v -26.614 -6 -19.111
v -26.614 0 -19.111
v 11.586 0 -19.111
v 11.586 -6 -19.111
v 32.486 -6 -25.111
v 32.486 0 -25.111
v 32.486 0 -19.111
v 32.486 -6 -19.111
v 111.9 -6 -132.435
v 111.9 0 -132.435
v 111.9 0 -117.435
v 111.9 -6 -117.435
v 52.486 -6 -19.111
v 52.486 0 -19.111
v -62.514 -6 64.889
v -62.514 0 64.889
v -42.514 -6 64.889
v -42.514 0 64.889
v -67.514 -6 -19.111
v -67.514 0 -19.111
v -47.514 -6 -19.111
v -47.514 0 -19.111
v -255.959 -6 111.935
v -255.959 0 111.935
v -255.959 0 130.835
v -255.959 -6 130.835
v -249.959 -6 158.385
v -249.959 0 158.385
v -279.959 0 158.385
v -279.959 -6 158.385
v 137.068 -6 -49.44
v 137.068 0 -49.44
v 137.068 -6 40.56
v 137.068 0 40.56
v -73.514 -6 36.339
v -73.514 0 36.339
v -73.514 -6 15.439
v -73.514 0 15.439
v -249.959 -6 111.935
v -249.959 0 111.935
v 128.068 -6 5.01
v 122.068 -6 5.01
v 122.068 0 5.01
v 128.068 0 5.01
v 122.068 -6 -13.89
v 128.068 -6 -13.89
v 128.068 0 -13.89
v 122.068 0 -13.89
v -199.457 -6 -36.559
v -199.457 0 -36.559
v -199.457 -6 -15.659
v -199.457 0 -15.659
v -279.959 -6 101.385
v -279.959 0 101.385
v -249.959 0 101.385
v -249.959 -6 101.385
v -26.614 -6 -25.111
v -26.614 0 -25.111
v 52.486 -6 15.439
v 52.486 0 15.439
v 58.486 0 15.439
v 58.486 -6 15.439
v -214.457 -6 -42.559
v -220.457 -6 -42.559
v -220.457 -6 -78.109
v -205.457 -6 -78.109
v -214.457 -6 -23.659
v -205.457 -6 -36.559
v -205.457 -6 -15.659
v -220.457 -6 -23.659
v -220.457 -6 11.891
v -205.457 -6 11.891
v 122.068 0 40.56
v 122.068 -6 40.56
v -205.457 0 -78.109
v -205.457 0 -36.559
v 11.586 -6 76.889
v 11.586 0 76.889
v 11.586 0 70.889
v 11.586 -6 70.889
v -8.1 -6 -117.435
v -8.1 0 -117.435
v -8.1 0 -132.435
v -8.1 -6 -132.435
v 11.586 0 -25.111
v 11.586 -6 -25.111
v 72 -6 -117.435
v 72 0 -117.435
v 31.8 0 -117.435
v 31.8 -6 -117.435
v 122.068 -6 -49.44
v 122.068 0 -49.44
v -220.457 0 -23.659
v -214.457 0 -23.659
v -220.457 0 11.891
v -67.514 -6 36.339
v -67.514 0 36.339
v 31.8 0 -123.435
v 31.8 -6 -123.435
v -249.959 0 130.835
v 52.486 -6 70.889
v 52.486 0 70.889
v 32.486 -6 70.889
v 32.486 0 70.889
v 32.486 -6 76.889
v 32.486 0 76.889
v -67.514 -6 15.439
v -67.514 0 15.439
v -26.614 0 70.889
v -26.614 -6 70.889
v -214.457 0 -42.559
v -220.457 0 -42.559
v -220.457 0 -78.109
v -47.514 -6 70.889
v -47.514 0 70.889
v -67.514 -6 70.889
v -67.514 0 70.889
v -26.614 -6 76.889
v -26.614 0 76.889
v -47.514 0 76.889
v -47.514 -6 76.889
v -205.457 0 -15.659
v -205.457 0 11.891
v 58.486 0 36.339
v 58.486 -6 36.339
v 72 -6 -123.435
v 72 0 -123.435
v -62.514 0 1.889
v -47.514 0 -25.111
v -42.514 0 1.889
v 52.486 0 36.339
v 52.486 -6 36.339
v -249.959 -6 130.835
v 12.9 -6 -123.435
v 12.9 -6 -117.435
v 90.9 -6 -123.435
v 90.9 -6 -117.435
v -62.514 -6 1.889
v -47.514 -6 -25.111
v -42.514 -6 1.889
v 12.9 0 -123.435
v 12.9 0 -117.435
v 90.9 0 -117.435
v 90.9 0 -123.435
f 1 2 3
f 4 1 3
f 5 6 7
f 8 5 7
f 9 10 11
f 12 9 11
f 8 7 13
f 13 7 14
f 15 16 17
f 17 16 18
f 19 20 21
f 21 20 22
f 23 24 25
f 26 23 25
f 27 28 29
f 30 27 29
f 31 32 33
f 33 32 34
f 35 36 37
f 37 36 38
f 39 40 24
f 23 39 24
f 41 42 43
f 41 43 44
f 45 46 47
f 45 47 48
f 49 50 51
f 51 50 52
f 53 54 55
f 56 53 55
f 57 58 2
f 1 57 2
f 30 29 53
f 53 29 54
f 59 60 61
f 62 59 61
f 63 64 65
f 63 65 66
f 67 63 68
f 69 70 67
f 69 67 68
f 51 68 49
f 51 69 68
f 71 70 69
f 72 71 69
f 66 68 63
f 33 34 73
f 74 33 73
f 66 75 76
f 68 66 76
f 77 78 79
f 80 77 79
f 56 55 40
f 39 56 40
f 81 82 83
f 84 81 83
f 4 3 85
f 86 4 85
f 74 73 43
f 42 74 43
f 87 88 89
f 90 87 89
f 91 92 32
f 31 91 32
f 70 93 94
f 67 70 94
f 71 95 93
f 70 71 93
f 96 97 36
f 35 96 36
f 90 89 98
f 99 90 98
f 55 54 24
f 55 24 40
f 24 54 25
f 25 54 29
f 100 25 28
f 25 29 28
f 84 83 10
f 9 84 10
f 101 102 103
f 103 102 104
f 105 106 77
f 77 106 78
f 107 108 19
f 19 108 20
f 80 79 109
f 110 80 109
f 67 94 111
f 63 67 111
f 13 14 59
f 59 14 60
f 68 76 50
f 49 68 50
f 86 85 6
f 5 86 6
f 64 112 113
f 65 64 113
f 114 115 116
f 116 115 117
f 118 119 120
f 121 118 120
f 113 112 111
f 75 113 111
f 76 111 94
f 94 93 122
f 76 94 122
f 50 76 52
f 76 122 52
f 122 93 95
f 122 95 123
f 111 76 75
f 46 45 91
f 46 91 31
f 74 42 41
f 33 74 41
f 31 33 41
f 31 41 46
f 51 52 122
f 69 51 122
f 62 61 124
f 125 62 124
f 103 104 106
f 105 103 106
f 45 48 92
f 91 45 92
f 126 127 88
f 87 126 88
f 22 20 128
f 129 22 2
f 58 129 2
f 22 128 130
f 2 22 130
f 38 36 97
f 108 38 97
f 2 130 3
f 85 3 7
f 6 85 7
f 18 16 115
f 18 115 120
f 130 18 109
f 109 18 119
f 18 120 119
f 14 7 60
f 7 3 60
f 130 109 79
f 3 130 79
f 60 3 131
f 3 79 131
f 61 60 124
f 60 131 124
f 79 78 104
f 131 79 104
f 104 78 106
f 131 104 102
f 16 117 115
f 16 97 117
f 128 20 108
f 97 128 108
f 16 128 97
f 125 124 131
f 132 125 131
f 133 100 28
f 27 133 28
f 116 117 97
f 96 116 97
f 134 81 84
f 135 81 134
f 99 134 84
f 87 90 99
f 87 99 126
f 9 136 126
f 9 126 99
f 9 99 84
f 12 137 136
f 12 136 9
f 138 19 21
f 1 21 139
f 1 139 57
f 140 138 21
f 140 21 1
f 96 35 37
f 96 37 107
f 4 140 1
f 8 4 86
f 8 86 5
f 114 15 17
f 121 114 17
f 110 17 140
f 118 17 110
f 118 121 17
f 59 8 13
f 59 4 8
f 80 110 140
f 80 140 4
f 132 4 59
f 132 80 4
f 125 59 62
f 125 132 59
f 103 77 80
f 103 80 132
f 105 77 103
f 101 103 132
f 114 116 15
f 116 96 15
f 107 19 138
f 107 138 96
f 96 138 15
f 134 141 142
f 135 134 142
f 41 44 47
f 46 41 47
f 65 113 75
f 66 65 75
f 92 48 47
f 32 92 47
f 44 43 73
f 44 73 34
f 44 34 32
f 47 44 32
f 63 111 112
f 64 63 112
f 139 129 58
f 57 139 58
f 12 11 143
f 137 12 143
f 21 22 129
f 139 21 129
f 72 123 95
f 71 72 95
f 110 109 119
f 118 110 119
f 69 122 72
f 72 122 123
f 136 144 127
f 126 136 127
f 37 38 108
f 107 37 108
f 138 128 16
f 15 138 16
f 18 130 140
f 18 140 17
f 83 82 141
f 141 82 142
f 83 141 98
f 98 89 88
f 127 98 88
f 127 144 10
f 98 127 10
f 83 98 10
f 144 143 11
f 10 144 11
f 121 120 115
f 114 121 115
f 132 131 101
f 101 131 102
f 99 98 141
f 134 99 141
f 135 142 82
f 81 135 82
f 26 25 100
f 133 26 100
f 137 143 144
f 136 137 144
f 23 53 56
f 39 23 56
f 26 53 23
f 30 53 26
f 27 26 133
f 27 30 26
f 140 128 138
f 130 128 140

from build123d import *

# Parameters (mm, degrees)
F0_W     = 20
F0_H     = 63
F1_DEPTH = 6


with BuildPart() as f1:
    # F0 (on Front) → F1 (new body)
    with BuildSketch(Plane.XZ):
        Polygon((-47.513727, 70.888719), (-67.513727, 70.888719), (-67.513727, 36.338719), (-73.513727, 36.338719), (-73.513727, 15.438719), (-67.513727, 15.438719), (-67.513727, -19.111281), (-47.513727, -19.111281), (-47.513727, -25.111281), (-26.613727, -25.111281), (-26.613727, -19.111281), (11.586273, -19.111281), (11.586273, -25.111281), (32.486273, -25.111281), (32.486273, -19.111281), (52.486273, -19.111281), (52.486273, 15.438719), (58.486273, 15.438719), (58.486273, 36.338719), (52.486273, 36.338719), (52.486273, 70.888719), (32.486273, 70.888719), (32.486273, 76.888719), (11.586273, 76.888719), (11.586273, 70.888719), (-26.613727, 70.888719), (-26.613727, 76.888719), (-47.513727, 76.888719), align=None)
        with Locations((-52.513727, 33.388719)):
            Rectangle(F0_W, F0_H, mode=Mode.SUBTRACT)
        Polygon((12.900374, -117.434592), (-8.099626, -117.434592), (-8.099626, -132.434592), (111.900374, -132.434592), (111.900374, -117.434592), (90.900374, -117.434592), (90.900374, -123.434592), (72.000374, -123.434592), (72.000374, -117.434592), (31.800374, -117.434592), (31.800374, -123.434592), (12.900374, -123.434592), align=None)
        Polygon((137.0681, -49.440384), (137.0681, 40.559616), (122.0681, 40.559616), (122.0681, 5.009616), (128.0681, 5.009616), (128.0681, -13.890384), (122.0681, -13.890384), (122.0681, -49.440384), align=None)
        Polygon((-205.456549, -15.658894), (-205.456549, 11.891106), (-220.456549, 11.891106), (-220.456549, -23.658894), (-214.456549, -23.658894), (-214.456549, -42.558894), (-220.456549, -42.558894), (-220.456549, -78.108894), (-205.456549, -78.108894), (-205.456549, -36.558894), (-199.456549, -36.558894), (-199.456549, -15.658894), align=None)
        Polygon((-249.959351, 158.38494), (-279.959351, 158.38494), (-279.959351, 101.38494), (-249.959351, 101.38494), (-249.959351, 111.93494), (-255.959351, 111.93494), (-255.959351, 130.83494), (-249.959351, 130.83494), align=None)
    extrude(amount=F1_DEPTH)


solid = f1.part
